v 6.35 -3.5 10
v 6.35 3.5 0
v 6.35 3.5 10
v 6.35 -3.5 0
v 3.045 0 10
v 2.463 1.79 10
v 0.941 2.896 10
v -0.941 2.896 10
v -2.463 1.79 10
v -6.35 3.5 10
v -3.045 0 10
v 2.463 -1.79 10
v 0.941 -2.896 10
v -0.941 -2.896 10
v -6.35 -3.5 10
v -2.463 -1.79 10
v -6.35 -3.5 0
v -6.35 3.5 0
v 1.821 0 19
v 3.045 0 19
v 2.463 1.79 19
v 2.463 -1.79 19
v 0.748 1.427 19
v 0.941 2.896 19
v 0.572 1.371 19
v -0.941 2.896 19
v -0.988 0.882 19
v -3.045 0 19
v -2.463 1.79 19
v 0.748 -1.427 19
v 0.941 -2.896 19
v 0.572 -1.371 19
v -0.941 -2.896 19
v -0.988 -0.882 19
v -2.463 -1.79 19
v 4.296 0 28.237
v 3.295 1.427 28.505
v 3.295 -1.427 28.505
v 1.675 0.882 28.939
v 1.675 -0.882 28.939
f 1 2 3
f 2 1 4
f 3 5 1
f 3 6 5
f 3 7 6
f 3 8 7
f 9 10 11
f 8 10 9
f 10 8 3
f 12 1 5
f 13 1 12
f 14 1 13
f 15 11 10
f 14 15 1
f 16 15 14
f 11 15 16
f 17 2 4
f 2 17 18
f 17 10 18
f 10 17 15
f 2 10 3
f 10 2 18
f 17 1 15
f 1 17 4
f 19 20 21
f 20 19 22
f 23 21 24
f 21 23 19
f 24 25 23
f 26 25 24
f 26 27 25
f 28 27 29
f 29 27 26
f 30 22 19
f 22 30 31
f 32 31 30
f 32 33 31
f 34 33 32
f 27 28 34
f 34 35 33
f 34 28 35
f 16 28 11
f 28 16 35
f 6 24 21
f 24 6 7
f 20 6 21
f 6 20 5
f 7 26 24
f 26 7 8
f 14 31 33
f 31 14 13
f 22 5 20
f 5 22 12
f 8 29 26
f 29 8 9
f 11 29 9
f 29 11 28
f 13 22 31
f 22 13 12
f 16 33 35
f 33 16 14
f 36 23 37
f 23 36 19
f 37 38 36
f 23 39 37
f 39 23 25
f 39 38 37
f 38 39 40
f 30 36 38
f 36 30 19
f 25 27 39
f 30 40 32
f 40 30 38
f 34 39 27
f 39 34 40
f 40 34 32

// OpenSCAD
module big_toggle_switch () {
    cd = [12.7, 7, 10]; // cube dimensions
    bh = 9; // barrel height
    // bottom part
    color("red") translate([-cd[0] / 2, -cd[1] / 2, 0]) 
        cube(cd);
    // barrel part
    color("silver") translate([0, 0, cd[2]]) 
        cylinder(d=6.09, h=bh);
    // toggle part
    color("silver") translate([0, 0, cd[2]+bh-1]) rotate([0,15,0]) 
        cylinder(d=3, h=10+1);
}

big_toggle_switch();
